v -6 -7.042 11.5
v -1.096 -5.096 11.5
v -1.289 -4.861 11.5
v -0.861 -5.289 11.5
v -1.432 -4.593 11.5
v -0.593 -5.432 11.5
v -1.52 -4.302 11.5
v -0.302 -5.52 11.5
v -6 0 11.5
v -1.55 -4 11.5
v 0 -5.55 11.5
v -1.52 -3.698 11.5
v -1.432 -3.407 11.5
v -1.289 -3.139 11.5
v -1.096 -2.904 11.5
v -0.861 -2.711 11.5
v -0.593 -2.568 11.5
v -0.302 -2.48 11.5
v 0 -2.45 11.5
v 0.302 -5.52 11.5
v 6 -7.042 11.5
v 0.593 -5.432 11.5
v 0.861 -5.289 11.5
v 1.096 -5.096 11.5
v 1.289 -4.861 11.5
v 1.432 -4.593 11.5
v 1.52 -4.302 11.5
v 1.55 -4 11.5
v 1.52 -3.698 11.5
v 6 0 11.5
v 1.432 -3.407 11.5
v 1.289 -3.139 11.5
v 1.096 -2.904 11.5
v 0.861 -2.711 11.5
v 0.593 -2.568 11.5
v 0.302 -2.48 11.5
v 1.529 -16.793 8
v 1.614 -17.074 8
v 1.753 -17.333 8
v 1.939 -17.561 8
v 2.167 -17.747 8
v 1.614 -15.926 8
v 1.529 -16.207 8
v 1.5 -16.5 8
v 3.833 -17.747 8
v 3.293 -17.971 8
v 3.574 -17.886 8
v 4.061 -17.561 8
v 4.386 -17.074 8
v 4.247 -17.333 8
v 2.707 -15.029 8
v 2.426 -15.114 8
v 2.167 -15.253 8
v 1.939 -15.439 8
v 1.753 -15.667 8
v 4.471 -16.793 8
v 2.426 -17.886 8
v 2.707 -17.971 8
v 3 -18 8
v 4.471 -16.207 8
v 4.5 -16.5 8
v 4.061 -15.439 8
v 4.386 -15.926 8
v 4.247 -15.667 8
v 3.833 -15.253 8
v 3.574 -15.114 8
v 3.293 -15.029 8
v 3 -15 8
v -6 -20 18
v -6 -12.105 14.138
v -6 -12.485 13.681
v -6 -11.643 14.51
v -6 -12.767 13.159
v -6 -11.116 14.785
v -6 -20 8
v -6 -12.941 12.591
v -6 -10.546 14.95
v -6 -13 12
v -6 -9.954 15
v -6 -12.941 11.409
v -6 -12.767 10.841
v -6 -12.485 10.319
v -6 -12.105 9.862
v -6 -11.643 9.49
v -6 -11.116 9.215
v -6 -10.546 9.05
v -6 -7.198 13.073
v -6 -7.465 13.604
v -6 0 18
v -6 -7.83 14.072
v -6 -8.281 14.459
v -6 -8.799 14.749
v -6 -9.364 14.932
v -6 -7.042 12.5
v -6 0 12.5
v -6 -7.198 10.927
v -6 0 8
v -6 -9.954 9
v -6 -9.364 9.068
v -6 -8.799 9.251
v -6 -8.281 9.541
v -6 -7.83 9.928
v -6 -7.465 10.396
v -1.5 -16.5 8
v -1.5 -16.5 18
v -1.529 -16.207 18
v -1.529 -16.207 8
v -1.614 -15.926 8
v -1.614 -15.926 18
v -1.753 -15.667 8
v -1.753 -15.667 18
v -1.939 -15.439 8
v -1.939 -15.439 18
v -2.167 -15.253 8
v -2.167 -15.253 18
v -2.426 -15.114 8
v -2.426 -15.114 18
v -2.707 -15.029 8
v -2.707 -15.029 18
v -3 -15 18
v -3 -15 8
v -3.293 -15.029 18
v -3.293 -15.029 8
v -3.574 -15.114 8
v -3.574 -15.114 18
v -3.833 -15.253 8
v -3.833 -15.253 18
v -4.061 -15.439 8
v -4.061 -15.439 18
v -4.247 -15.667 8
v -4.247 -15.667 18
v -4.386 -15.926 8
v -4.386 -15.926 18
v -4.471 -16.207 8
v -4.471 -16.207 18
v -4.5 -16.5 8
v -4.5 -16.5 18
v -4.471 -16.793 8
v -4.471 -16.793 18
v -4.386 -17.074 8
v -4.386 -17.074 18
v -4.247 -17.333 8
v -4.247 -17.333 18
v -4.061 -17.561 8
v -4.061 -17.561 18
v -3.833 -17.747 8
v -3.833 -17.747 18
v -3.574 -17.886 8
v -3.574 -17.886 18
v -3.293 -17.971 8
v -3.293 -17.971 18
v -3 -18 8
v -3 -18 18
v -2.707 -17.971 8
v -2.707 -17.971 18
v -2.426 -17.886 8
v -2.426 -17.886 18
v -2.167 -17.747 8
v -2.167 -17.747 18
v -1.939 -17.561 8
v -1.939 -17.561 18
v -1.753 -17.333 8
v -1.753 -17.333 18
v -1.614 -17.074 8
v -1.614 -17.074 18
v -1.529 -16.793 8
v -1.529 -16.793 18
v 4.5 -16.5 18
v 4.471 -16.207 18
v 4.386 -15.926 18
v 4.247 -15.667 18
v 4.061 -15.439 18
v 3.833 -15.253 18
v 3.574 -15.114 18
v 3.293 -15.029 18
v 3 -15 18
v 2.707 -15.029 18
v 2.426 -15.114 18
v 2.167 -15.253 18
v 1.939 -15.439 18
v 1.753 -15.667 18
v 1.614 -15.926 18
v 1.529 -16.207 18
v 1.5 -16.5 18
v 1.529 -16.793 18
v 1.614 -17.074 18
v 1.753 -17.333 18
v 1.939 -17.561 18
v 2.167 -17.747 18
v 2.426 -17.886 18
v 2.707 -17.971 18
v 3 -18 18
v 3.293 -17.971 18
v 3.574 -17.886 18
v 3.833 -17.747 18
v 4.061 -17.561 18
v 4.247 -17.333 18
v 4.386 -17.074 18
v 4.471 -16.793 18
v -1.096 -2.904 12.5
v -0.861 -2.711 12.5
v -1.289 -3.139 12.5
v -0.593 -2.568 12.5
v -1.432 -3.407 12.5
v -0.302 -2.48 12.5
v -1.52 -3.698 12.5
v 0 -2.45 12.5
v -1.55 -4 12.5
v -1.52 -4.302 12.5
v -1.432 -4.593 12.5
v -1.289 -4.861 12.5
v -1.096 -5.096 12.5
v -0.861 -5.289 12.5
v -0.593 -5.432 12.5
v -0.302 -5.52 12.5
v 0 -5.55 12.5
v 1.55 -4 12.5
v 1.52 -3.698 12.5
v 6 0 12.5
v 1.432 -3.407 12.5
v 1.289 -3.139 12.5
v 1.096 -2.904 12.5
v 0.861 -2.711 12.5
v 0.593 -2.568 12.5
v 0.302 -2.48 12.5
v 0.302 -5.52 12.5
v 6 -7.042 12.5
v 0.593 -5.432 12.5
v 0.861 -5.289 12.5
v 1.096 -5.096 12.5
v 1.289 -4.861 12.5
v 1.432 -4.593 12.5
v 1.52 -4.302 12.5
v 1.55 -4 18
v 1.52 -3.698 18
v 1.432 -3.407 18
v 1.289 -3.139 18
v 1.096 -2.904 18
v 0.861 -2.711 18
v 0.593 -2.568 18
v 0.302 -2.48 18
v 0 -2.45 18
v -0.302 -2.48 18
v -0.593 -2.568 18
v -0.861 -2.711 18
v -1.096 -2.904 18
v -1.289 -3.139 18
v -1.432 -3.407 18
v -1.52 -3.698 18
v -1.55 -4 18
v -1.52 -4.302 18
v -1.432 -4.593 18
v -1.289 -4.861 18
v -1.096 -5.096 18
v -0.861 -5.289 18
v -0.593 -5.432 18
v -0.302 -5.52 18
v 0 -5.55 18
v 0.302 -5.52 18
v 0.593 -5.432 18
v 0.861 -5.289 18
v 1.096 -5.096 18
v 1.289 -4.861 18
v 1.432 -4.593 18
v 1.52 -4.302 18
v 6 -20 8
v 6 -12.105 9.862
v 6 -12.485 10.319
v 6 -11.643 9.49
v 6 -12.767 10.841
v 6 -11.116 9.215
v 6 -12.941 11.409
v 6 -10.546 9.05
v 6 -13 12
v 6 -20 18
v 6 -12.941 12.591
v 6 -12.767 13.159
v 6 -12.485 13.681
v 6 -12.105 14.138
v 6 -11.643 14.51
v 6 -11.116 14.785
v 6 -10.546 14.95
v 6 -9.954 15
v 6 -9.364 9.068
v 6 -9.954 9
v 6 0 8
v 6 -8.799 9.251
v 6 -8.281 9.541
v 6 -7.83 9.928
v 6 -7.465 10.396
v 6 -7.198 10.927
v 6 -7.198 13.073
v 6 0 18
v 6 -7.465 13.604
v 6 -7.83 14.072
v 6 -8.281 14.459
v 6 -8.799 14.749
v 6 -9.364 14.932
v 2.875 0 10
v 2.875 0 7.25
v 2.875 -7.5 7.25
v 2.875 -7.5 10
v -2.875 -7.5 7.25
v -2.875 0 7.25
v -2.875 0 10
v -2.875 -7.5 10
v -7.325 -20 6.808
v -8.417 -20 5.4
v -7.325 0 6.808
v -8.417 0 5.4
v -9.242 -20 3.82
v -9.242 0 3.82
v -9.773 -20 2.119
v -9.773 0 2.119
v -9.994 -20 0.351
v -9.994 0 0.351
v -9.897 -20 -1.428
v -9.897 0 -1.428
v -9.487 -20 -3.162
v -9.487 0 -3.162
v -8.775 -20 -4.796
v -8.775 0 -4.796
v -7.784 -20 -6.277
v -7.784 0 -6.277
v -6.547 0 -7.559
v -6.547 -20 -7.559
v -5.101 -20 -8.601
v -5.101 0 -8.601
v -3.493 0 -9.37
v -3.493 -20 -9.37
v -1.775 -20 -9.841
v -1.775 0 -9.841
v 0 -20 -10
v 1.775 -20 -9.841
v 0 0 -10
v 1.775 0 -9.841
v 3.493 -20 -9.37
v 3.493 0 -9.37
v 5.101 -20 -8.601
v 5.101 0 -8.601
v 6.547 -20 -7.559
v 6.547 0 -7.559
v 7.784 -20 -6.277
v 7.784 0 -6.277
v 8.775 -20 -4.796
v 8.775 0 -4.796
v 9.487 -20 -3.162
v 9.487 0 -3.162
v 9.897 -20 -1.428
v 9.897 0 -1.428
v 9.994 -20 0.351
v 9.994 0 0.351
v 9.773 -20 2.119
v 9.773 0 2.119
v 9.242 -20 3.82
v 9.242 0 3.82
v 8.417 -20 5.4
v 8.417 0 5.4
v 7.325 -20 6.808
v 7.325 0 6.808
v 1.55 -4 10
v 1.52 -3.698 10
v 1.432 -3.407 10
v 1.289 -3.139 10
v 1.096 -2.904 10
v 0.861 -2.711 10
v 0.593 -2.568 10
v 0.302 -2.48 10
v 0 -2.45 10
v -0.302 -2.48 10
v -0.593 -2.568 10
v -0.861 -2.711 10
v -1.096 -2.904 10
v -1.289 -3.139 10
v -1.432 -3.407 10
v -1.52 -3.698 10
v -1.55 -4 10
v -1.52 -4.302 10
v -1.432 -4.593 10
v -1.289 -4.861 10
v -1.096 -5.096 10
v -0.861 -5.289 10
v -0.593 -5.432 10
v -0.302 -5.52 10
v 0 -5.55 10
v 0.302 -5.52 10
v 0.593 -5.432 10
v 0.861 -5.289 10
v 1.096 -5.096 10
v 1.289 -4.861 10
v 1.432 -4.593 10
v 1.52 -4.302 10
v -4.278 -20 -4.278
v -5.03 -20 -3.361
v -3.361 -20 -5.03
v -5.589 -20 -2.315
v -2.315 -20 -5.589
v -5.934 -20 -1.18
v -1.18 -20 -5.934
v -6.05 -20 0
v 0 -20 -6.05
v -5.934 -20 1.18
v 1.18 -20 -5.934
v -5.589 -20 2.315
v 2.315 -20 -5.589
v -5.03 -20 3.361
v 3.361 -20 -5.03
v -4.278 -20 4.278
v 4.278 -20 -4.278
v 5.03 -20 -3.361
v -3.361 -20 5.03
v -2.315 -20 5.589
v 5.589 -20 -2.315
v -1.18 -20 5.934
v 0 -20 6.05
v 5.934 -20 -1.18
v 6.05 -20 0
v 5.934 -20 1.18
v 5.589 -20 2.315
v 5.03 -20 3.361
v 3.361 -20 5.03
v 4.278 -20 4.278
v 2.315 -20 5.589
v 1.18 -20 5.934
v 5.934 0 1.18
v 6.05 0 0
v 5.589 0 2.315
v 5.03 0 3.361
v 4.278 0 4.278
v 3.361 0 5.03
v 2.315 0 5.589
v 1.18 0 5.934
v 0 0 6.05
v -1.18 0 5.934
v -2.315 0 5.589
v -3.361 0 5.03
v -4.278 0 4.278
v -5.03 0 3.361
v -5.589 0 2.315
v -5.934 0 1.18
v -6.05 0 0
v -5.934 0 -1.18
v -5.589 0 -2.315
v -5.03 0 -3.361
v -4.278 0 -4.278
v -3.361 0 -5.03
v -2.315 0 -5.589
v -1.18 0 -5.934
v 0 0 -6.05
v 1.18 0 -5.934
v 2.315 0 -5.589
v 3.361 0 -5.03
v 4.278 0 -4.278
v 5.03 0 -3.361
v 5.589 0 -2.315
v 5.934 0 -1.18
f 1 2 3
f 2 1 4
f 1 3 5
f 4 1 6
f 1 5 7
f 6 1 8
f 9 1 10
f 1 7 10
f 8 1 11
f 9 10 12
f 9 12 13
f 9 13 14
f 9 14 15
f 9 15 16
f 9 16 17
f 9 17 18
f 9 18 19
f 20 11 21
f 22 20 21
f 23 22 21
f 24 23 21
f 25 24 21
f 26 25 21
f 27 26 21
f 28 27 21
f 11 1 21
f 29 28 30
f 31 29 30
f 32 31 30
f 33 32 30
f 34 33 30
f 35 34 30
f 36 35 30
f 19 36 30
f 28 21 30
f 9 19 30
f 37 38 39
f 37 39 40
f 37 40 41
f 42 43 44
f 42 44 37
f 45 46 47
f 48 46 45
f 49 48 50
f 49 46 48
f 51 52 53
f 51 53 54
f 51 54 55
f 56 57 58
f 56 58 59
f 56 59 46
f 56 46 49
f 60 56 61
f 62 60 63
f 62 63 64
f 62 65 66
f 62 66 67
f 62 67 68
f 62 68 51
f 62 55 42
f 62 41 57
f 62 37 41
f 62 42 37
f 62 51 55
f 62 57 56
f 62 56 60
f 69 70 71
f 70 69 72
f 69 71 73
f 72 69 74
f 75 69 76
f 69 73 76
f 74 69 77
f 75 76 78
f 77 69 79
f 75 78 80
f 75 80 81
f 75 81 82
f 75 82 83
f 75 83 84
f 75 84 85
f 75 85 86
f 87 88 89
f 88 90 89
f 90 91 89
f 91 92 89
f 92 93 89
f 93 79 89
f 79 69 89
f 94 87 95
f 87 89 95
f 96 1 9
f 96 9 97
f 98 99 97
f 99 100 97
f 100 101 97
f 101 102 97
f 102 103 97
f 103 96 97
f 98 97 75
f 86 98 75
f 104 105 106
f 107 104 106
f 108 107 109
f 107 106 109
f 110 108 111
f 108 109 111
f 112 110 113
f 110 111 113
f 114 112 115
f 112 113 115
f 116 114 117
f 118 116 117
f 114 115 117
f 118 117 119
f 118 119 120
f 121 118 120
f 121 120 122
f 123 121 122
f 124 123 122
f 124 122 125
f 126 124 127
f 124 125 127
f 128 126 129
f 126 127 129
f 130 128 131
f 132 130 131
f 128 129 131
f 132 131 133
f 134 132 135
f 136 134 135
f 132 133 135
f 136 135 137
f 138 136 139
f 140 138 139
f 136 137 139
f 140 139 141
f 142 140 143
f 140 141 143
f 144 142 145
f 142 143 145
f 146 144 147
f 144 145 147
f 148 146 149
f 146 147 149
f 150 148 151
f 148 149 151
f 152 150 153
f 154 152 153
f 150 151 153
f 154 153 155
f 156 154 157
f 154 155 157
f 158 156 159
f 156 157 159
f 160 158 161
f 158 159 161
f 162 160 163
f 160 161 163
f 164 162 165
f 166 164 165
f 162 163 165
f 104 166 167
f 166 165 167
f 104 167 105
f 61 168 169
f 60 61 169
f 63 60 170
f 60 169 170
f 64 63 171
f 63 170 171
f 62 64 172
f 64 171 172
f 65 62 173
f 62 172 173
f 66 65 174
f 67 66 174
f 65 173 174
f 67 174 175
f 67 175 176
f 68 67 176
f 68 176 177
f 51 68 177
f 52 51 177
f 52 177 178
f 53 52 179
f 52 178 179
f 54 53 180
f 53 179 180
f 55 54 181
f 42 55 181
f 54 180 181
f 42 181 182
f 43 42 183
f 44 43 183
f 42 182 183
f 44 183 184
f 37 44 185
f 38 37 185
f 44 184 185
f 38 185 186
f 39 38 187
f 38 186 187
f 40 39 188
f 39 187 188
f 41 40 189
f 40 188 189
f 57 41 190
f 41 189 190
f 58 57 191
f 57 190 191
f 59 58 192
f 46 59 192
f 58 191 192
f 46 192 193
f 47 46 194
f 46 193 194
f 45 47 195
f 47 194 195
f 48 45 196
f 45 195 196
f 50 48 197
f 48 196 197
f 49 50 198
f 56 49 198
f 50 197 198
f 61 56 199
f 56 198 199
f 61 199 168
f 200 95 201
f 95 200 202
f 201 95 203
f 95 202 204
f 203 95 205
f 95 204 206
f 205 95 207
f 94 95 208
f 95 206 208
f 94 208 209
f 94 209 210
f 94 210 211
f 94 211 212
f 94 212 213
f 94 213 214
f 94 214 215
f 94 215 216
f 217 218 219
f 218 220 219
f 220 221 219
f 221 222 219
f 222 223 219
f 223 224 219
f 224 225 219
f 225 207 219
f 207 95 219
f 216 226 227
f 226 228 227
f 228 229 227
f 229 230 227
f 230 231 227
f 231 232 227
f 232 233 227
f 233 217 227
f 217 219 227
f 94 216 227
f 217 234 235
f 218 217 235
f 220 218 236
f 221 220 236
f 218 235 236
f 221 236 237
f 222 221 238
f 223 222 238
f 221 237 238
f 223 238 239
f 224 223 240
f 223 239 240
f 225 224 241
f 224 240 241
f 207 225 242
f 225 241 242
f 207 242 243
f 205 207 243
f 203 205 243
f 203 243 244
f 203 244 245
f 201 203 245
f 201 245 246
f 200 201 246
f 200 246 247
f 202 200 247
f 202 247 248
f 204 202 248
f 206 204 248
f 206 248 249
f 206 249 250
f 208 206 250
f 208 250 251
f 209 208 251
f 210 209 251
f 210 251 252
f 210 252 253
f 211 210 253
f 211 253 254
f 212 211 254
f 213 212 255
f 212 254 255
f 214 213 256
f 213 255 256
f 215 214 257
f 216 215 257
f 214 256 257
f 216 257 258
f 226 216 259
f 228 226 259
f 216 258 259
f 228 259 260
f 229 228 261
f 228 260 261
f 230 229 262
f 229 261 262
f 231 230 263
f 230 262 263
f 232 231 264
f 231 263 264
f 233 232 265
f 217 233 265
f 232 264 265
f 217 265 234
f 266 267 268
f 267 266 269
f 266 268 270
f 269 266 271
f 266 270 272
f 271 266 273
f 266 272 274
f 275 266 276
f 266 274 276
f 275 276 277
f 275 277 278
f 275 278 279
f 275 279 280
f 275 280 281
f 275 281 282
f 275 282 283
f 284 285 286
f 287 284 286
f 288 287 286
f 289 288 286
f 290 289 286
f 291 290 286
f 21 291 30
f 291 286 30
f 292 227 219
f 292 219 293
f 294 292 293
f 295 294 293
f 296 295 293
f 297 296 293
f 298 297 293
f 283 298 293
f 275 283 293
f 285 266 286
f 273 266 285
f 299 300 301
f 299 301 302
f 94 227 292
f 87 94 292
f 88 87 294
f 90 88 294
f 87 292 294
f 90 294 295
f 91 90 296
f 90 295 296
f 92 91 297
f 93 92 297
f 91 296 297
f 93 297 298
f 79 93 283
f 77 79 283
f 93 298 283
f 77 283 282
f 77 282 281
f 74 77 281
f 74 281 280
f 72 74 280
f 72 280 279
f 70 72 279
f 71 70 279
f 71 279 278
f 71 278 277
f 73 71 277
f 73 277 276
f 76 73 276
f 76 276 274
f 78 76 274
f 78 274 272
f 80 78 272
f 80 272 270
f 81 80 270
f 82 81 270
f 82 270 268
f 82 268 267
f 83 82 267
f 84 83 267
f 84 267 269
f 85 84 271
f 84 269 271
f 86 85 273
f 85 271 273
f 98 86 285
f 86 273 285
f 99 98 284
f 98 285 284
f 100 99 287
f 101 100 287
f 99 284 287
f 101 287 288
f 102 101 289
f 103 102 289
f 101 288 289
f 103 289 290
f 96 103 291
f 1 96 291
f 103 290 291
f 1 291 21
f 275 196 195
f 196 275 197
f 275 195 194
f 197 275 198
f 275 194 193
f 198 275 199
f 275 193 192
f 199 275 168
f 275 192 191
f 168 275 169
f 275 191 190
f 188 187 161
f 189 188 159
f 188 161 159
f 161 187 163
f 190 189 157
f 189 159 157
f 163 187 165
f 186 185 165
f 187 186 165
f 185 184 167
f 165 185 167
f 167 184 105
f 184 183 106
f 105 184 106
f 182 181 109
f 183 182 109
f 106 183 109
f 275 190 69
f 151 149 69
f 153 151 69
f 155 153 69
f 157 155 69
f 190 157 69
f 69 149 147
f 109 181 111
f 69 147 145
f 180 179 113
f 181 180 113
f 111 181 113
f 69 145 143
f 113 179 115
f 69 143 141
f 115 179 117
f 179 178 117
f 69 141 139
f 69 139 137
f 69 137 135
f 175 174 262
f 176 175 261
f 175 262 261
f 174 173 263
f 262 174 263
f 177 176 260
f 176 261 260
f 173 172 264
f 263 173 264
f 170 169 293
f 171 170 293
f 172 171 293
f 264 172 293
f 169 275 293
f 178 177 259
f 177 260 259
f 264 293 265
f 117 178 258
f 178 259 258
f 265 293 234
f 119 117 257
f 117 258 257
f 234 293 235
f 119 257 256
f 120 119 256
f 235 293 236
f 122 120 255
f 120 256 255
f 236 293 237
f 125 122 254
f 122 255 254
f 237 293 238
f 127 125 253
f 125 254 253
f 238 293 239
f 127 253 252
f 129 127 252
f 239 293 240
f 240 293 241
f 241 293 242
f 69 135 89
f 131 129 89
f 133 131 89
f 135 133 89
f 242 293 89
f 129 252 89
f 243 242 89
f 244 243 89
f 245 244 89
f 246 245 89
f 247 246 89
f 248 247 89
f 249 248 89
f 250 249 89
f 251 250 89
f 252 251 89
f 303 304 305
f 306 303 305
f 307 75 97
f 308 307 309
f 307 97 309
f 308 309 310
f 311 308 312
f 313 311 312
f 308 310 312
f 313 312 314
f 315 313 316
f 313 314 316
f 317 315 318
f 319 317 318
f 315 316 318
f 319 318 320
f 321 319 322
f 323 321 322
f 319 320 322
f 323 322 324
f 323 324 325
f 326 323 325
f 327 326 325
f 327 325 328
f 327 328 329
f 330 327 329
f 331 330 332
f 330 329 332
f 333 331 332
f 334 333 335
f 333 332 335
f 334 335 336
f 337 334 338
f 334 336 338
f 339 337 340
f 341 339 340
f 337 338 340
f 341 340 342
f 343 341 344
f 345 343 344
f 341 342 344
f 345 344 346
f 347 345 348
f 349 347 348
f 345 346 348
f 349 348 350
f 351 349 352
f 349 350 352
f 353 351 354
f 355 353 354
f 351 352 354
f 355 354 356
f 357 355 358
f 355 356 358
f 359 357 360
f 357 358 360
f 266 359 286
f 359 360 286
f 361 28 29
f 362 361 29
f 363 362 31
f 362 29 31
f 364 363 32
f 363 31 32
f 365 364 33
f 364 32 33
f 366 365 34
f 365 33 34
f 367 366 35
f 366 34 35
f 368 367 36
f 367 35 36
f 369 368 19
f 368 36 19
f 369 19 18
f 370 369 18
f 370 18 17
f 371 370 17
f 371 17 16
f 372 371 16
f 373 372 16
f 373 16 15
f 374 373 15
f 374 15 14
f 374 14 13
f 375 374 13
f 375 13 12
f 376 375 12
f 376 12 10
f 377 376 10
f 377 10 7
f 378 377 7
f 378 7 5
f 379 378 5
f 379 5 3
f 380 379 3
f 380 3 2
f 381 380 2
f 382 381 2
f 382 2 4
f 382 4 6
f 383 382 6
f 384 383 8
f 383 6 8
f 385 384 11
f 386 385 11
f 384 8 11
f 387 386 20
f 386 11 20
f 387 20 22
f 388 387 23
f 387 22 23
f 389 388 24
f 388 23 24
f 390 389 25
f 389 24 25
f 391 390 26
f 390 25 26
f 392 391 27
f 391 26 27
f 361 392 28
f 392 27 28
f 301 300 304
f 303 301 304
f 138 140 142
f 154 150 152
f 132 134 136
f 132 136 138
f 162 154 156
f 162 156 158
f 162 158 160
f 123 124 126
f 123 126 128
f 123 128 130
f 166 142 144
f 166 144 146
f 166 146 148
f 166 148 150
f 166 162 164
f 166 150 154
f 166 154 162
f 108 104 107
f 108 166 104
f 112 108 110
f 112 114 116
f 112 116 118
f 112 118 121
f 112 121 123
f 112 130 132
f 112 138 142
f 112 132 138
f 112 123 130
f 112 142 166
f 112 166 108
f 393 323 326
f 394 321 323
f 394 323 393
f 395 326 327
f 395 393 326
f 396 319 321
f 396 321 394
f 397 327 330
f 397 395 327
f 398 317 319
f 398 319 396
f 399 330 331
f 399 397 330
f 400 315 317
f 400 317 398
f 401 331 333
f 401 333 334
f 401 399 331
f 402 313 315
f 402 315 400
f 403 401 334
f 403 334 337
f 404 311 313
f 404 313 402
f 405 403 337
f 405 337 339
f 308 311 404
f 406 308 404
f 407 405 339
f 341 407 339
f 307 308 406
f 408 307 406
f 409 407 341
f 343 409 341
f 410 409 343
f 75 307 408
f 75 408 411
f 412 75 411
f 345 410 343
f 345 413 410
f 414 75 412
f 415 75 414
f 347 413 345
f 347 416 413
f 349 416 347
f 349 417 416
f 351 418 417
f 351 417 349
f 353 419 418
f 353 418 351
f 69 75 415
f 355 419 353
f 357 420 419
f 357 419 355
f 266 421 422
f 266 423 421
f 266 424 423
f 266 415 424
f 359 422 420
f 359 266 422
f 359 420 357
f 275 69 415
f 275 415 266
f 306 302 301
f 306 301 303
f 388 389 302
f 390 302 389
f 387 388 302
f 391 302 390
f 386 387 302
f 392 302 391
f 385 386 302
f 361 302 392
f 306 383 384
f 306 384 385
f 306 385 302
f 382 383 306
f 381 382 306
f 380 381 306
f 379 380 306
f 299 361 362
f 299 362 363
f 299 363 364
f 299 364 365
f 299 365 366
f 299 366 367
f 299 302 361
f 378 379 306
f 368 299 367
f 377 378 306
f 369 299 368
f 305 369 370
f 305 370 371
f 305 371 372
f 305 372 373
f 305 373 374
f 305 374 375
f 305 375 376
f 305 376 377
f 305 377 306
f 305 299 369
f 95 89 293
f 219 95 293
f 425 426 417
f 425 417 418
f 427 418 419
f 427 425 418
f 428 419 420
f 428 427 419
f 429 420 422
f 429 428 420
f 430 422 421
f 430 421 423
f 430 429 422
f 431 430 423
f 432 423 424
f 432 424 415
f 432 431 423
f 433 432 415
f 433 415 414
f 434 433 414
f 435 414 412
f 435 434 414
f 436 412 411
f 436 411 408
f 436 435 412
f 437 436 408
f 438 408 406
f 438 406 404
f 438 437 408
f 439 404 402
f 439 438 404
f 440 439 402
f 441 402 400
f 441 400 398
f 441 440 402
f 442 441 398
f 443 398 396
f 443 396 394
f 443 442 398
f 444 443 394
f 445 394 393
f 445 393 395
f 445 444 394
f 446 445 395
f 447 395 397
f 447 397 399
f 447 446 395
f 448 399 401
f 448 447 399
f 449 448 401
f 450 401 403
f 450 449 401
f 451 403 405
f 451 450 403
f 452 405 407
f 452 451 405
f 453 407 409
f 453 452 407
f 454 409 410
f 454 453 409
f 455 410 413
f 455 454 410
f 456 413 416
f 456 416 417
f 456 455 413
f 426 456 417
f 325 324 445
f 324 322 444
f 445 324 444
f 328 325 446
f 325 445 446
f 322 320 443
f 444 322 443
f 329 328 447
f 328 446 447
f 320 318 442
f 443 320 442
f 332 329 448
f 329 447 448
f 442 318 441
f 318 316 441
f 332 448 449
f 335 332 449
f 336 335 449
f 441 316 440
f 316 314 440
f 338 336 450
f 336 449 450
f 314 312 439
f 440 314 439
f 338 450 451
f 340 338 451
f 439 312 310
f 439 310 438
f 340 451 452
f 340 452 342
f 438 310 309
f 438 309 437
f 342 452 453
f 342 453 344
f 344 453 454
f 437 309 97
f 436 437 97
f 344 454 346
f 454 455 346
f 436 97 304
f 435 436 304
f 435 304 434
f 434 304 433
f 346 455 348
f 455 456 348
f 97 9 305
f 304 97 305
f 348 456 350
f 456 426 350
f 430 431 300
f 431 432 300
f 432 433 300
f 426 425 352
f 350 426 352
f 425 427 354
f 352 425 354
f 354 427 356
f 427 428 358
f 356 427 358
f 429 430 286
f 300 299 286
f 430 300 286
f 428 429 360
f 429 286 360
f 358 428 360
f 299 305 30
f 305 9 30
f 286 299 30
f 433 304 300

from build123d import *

# Parameters (mm, degrees)
F0_R      = 6.05
F1_DEPTH  = 20
F3_DEPTH  = 25
F4_W      = 5.75
F4_H      = 2.75
F5_DEPTH  = 7.5
F6_R      = 1.55
F7_DEPTH  = 10
F9_R      = 1.5
F10_DEPTH = 10


with BuildPart() as f1:
    # F0 (on Front) → F1 (new body)
    with BuildSketch(Plane.XZ):
        with BuildLine():
            Line((-6, 18), (-6, 8))
            ThreePointArc((-6, 8), (0, -10), (6, 8))
            Line((6, 8), (6, 18))
            Line((6, 18), (-6, 18))
        make_face()
        Circle(F0_R, mode=Mode.SUBTRACT)
    extrude(amount=F1_DEPTH)

    # F2 (on face) → F3 (cut)
    with BuildSketch(Plane.YZ.offset(6)):
        with BuildLine():
            Line((0, 12.5), (-7.04196, 12.5))
            ThreePointArc((-7.04196, 12.5), (-13, 12), (-7.04196, 11.5))
            Line((-7.04196, 11.5), (0, 11.5))
            Line((0, 11.5), (0, 12.5))
        make_face()
    extrude(amount=-F3_DEPTH, mode=Mode.SUBTRACT)

    # F4 (on face) → F5 (cut)
    with BuildSketch(Plane(origin=(0, 0, 0), x_dir=(-1, 0, 0), z_dir=(0, 1, 0))):
        with Locations((0, 8.625)):
            Rectangle(F4_W, F4_H)
    extrude(amount=-F5_DEPTH, mode=Mode.SUBTRACT)

    # F6 (on face) → F7 (cut)
    with BuildSketch(Plane.XY.offset(18)):
        with Locations((0, -4)):
            Circle(F6_R)
    extrude(amount=-F7_DEPTH, mode=Mode.SUBTRACT)

    # F9 (on face) → F10 (cut)
    with BuildSketch(Plane.XY.offset(18)):
        with Locations((-3, -16.5)):
            Circle(F9_R)
        with Locations((3, -16.5)):
            Circle(F9_R)
    extrude(amount=-F10_DEPTH, mode=Mode.SUBTRACT)


solid = f1.part
